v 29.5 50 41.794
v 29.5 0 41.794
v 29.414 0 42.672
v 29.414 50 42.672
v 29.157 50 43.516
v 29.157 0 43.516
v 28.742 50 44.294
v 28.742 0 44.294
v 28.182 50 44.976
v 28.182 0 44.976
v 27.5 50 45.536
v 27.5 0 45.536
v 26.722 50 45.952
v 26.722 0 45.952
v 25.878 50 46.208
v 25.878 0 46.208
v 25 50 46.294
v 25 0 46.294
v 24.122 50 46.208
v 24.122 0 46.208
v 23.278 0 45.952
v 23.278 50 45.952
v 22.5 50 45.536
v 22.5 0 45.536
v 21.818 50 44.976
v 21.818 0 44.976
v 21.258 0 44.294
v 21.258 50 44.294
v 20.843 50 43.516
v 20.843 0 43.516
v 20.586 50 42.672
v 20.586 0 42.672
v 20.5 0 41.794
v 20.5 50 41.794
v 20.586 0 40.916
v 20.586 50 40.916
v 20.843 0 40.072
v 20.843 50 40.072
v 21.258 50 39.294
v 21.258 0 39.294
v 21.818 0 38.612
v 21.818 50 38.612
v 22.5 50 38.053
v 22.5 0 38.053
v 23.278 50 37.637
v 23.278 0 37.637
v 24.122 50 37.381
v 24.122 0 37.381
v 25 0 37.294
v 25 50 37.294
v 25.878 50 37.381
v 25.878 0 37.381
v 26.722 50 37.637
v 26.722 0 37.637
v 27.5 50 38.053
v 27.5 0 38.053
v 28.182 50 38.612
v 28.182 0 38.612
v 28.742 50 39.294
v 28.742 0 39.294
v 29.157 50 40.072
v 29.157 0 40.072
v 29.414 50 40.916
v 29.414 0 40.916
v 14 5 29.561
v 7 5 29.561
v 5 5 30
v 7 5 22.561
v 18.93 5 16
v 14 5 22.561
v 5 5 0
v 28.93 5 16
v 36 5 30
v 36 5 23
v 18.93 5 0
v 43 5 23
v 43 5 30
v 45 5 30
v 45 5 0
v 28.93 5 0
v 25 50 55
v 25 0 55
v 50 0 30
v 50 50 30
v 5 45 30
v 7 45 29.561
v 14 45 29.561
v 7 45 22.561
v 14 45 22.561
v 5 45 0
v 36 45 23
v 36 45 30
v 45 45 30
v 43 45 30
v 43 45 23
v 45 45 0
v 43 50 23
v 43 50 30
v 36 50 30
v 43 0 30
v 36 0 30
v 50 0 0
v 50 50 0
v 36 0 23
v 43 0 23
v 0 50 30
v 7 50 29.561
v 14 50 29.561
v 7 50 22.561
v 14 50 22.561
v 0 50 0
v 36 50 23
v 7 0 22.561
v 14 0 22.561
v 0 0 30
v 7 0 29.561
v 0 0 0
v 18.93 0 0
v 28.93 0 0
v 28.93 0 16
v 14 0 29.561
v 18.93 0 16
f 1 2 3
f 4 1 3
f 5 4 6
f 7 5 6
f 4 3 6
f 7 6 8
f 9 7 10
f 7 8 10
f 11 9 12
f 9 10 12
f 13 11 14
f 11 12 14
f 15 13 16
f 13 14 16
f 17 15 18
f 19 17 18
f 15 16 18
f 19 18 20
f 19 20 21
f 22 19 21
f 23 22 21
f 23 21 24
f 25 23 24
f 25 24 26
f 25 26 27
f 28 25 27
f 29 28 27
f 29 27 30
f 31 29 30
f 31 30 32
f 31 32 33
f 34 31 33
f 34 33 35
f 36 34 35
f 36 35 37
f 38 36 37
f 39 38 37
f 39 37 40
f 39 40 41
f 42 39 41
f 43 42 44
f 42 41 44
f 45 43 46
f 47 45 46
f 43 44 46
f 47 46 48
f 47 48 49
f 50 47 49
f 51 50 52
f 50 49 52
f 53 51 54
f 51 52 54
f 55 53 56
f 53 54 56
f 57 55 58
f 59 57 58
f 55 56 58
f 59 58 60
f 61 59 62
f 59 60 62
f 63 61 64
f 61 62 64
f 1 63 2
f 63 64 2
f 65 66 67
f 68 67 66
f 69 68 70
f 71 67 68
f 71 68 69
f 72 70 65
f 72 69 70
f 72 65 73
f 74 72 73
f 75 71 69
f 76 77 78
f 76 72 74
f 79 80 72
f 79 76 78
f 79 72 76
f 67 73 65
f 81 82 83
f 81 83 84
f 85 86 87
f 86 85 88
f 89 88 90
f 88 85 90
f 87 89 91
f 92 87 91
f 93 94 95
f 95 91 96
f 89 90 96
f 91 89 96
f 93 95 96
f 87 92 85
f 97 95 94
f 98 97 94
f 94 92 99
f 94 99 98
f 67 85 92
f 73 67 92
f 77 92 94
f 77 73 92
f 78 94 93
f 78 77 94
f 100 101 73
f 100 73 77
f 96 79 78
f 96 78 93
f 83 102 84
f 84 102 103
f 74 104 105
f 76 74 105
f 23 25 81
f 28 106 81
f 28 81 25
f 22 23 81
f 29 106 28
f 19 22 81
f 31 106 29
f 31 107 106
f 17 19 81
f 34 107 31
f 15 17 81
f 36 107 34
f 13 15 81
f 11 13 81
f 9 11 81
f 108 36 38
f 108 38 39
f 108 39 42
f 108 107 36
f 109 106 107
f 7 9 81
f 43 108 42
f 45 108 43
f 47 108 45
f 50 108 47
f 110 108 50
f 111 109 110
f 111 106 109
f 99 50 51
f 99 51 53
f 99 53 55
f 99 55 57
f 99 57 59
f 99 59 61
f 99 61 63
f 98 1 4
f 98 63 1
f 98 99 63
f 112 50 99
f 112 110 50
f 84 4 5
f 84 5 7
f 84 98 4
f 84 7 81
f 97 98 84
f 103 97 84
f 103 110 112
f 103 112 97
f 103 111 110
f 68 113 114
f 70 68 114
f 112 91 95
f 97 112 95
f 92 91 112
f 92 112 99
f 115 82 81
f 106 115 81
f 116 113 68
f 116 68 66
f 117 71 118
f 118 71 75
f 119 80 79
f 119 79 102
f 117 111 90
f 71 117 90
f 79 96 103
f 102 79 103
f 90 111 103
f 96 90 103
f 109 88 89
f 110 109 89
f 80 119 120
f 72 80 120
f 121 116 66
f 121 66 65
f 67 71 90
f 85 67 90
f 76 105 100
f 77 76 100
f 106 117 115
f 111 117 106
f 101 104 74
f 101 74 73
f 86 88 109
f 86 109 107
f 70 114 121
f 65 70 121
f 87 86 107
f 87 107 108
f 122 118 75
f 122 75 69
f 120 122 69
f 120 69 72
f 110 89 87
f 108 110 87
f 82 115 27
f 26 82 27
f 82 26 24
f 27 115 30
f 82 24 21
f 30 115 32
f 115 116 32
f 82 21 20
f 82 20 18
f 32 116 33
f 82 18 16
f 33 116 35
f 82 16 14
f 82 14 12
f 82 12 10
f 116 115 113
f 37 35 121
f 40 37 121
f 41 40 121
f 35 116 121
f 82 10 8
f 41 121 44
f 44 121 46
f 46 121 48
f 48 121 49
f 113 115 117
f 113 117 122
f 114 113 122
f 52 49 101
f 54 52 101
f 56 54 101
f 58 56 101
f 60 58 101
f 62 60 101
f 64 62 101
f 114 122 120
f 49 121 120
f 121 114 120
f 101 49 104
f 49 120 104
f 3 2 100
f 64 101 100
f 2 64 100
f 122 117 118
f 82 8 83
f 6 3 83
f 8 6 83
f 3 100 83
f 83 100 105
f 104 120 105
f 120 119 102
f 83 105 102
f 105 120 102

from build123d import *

# Parameters (mm, degrees)
F0_W     = 50
F0_H     = 50
F0_W_2   = 40
F0_H_2   = 40
F1_DEPTH = 30
F2_W     = 50
F2_H     = 50
F3_DEPTH = 25
F4_SIZE  = 24.99999
F5_W     = 10
F5_H     = 16
F6_DEPTH = 5
F5_W_2   = 7
F5_H_2   = 7
F7_DEPTH = 50.001
F5_R     = 4.5
F8_DEPTH = 50.001


# Not quite as in the source:
# - a fillet or chamfer is up to 0.001 mm smaller than in the source, because OpenCascade refuses the exact size


with BuildPart() as f1:
    # F0 (on Top) → F1 (new body)
    with BuildSketch(Plane.XY):
        with Locations((25, 25)):
            Rectangle(F0_W, F0_H)
        with Locations((25, 25)):
            Rectangle(F0_W_2, F0_H_2, mode=Mode.SUBTRACT)
    extrude(amount=F1_DEPTH)

    # F2 (on face) → F3 (join)
    with BuildSketch(Plane.XY.offset(30)):
        with Locations((25, 25)):
            Rectangle(F2_W, F2_H)
    extrude(amount=F3_DEPTH)

    # F4 (size 25 in the source; OpenCascade refuses exactly that, so slightly less here)
    f4_edges = [f1.edges().sort_by_distance(p)[0] for p in [
        (0, 25, 55),
        (50, 25, 55),
    ]]
    chamfer(f4_edges, length=F4_SIZE)

    # F5 (on face) → F6 (cut)
    with BuildSketch(Plane.XZ):
        with Locations((23.930438906, 8)):
            Rectangle(F5_W, F5_H)
    extrude(amount=-F6_DEPTH, mode=Mode.SUBTRACT)

    # F5 (on face) → F7 (cut, through all)
    with BuildSketch(Plane.XZ):
        with Locations((10.5, 26.0614674687)):
            Rectangle(F5_W_2, F5_H_2)
        with Locations((39.5, 26.5)):
            Rectangle(F5_W_2, F5_H_2)
    extrude(amount=-F7_DEPTH, mode=Mode.SUBTRACT)

    # F5 (on face) → F8 (cut, through all)
    with BuildSketch(Plane.XZ):
        with Locations((25, 41.7942066526)):
            Circle(F5_R)
    extrude(amount=-F8_DEPTH, mode=Mode.SUBTRACT)


solid = f1.part
